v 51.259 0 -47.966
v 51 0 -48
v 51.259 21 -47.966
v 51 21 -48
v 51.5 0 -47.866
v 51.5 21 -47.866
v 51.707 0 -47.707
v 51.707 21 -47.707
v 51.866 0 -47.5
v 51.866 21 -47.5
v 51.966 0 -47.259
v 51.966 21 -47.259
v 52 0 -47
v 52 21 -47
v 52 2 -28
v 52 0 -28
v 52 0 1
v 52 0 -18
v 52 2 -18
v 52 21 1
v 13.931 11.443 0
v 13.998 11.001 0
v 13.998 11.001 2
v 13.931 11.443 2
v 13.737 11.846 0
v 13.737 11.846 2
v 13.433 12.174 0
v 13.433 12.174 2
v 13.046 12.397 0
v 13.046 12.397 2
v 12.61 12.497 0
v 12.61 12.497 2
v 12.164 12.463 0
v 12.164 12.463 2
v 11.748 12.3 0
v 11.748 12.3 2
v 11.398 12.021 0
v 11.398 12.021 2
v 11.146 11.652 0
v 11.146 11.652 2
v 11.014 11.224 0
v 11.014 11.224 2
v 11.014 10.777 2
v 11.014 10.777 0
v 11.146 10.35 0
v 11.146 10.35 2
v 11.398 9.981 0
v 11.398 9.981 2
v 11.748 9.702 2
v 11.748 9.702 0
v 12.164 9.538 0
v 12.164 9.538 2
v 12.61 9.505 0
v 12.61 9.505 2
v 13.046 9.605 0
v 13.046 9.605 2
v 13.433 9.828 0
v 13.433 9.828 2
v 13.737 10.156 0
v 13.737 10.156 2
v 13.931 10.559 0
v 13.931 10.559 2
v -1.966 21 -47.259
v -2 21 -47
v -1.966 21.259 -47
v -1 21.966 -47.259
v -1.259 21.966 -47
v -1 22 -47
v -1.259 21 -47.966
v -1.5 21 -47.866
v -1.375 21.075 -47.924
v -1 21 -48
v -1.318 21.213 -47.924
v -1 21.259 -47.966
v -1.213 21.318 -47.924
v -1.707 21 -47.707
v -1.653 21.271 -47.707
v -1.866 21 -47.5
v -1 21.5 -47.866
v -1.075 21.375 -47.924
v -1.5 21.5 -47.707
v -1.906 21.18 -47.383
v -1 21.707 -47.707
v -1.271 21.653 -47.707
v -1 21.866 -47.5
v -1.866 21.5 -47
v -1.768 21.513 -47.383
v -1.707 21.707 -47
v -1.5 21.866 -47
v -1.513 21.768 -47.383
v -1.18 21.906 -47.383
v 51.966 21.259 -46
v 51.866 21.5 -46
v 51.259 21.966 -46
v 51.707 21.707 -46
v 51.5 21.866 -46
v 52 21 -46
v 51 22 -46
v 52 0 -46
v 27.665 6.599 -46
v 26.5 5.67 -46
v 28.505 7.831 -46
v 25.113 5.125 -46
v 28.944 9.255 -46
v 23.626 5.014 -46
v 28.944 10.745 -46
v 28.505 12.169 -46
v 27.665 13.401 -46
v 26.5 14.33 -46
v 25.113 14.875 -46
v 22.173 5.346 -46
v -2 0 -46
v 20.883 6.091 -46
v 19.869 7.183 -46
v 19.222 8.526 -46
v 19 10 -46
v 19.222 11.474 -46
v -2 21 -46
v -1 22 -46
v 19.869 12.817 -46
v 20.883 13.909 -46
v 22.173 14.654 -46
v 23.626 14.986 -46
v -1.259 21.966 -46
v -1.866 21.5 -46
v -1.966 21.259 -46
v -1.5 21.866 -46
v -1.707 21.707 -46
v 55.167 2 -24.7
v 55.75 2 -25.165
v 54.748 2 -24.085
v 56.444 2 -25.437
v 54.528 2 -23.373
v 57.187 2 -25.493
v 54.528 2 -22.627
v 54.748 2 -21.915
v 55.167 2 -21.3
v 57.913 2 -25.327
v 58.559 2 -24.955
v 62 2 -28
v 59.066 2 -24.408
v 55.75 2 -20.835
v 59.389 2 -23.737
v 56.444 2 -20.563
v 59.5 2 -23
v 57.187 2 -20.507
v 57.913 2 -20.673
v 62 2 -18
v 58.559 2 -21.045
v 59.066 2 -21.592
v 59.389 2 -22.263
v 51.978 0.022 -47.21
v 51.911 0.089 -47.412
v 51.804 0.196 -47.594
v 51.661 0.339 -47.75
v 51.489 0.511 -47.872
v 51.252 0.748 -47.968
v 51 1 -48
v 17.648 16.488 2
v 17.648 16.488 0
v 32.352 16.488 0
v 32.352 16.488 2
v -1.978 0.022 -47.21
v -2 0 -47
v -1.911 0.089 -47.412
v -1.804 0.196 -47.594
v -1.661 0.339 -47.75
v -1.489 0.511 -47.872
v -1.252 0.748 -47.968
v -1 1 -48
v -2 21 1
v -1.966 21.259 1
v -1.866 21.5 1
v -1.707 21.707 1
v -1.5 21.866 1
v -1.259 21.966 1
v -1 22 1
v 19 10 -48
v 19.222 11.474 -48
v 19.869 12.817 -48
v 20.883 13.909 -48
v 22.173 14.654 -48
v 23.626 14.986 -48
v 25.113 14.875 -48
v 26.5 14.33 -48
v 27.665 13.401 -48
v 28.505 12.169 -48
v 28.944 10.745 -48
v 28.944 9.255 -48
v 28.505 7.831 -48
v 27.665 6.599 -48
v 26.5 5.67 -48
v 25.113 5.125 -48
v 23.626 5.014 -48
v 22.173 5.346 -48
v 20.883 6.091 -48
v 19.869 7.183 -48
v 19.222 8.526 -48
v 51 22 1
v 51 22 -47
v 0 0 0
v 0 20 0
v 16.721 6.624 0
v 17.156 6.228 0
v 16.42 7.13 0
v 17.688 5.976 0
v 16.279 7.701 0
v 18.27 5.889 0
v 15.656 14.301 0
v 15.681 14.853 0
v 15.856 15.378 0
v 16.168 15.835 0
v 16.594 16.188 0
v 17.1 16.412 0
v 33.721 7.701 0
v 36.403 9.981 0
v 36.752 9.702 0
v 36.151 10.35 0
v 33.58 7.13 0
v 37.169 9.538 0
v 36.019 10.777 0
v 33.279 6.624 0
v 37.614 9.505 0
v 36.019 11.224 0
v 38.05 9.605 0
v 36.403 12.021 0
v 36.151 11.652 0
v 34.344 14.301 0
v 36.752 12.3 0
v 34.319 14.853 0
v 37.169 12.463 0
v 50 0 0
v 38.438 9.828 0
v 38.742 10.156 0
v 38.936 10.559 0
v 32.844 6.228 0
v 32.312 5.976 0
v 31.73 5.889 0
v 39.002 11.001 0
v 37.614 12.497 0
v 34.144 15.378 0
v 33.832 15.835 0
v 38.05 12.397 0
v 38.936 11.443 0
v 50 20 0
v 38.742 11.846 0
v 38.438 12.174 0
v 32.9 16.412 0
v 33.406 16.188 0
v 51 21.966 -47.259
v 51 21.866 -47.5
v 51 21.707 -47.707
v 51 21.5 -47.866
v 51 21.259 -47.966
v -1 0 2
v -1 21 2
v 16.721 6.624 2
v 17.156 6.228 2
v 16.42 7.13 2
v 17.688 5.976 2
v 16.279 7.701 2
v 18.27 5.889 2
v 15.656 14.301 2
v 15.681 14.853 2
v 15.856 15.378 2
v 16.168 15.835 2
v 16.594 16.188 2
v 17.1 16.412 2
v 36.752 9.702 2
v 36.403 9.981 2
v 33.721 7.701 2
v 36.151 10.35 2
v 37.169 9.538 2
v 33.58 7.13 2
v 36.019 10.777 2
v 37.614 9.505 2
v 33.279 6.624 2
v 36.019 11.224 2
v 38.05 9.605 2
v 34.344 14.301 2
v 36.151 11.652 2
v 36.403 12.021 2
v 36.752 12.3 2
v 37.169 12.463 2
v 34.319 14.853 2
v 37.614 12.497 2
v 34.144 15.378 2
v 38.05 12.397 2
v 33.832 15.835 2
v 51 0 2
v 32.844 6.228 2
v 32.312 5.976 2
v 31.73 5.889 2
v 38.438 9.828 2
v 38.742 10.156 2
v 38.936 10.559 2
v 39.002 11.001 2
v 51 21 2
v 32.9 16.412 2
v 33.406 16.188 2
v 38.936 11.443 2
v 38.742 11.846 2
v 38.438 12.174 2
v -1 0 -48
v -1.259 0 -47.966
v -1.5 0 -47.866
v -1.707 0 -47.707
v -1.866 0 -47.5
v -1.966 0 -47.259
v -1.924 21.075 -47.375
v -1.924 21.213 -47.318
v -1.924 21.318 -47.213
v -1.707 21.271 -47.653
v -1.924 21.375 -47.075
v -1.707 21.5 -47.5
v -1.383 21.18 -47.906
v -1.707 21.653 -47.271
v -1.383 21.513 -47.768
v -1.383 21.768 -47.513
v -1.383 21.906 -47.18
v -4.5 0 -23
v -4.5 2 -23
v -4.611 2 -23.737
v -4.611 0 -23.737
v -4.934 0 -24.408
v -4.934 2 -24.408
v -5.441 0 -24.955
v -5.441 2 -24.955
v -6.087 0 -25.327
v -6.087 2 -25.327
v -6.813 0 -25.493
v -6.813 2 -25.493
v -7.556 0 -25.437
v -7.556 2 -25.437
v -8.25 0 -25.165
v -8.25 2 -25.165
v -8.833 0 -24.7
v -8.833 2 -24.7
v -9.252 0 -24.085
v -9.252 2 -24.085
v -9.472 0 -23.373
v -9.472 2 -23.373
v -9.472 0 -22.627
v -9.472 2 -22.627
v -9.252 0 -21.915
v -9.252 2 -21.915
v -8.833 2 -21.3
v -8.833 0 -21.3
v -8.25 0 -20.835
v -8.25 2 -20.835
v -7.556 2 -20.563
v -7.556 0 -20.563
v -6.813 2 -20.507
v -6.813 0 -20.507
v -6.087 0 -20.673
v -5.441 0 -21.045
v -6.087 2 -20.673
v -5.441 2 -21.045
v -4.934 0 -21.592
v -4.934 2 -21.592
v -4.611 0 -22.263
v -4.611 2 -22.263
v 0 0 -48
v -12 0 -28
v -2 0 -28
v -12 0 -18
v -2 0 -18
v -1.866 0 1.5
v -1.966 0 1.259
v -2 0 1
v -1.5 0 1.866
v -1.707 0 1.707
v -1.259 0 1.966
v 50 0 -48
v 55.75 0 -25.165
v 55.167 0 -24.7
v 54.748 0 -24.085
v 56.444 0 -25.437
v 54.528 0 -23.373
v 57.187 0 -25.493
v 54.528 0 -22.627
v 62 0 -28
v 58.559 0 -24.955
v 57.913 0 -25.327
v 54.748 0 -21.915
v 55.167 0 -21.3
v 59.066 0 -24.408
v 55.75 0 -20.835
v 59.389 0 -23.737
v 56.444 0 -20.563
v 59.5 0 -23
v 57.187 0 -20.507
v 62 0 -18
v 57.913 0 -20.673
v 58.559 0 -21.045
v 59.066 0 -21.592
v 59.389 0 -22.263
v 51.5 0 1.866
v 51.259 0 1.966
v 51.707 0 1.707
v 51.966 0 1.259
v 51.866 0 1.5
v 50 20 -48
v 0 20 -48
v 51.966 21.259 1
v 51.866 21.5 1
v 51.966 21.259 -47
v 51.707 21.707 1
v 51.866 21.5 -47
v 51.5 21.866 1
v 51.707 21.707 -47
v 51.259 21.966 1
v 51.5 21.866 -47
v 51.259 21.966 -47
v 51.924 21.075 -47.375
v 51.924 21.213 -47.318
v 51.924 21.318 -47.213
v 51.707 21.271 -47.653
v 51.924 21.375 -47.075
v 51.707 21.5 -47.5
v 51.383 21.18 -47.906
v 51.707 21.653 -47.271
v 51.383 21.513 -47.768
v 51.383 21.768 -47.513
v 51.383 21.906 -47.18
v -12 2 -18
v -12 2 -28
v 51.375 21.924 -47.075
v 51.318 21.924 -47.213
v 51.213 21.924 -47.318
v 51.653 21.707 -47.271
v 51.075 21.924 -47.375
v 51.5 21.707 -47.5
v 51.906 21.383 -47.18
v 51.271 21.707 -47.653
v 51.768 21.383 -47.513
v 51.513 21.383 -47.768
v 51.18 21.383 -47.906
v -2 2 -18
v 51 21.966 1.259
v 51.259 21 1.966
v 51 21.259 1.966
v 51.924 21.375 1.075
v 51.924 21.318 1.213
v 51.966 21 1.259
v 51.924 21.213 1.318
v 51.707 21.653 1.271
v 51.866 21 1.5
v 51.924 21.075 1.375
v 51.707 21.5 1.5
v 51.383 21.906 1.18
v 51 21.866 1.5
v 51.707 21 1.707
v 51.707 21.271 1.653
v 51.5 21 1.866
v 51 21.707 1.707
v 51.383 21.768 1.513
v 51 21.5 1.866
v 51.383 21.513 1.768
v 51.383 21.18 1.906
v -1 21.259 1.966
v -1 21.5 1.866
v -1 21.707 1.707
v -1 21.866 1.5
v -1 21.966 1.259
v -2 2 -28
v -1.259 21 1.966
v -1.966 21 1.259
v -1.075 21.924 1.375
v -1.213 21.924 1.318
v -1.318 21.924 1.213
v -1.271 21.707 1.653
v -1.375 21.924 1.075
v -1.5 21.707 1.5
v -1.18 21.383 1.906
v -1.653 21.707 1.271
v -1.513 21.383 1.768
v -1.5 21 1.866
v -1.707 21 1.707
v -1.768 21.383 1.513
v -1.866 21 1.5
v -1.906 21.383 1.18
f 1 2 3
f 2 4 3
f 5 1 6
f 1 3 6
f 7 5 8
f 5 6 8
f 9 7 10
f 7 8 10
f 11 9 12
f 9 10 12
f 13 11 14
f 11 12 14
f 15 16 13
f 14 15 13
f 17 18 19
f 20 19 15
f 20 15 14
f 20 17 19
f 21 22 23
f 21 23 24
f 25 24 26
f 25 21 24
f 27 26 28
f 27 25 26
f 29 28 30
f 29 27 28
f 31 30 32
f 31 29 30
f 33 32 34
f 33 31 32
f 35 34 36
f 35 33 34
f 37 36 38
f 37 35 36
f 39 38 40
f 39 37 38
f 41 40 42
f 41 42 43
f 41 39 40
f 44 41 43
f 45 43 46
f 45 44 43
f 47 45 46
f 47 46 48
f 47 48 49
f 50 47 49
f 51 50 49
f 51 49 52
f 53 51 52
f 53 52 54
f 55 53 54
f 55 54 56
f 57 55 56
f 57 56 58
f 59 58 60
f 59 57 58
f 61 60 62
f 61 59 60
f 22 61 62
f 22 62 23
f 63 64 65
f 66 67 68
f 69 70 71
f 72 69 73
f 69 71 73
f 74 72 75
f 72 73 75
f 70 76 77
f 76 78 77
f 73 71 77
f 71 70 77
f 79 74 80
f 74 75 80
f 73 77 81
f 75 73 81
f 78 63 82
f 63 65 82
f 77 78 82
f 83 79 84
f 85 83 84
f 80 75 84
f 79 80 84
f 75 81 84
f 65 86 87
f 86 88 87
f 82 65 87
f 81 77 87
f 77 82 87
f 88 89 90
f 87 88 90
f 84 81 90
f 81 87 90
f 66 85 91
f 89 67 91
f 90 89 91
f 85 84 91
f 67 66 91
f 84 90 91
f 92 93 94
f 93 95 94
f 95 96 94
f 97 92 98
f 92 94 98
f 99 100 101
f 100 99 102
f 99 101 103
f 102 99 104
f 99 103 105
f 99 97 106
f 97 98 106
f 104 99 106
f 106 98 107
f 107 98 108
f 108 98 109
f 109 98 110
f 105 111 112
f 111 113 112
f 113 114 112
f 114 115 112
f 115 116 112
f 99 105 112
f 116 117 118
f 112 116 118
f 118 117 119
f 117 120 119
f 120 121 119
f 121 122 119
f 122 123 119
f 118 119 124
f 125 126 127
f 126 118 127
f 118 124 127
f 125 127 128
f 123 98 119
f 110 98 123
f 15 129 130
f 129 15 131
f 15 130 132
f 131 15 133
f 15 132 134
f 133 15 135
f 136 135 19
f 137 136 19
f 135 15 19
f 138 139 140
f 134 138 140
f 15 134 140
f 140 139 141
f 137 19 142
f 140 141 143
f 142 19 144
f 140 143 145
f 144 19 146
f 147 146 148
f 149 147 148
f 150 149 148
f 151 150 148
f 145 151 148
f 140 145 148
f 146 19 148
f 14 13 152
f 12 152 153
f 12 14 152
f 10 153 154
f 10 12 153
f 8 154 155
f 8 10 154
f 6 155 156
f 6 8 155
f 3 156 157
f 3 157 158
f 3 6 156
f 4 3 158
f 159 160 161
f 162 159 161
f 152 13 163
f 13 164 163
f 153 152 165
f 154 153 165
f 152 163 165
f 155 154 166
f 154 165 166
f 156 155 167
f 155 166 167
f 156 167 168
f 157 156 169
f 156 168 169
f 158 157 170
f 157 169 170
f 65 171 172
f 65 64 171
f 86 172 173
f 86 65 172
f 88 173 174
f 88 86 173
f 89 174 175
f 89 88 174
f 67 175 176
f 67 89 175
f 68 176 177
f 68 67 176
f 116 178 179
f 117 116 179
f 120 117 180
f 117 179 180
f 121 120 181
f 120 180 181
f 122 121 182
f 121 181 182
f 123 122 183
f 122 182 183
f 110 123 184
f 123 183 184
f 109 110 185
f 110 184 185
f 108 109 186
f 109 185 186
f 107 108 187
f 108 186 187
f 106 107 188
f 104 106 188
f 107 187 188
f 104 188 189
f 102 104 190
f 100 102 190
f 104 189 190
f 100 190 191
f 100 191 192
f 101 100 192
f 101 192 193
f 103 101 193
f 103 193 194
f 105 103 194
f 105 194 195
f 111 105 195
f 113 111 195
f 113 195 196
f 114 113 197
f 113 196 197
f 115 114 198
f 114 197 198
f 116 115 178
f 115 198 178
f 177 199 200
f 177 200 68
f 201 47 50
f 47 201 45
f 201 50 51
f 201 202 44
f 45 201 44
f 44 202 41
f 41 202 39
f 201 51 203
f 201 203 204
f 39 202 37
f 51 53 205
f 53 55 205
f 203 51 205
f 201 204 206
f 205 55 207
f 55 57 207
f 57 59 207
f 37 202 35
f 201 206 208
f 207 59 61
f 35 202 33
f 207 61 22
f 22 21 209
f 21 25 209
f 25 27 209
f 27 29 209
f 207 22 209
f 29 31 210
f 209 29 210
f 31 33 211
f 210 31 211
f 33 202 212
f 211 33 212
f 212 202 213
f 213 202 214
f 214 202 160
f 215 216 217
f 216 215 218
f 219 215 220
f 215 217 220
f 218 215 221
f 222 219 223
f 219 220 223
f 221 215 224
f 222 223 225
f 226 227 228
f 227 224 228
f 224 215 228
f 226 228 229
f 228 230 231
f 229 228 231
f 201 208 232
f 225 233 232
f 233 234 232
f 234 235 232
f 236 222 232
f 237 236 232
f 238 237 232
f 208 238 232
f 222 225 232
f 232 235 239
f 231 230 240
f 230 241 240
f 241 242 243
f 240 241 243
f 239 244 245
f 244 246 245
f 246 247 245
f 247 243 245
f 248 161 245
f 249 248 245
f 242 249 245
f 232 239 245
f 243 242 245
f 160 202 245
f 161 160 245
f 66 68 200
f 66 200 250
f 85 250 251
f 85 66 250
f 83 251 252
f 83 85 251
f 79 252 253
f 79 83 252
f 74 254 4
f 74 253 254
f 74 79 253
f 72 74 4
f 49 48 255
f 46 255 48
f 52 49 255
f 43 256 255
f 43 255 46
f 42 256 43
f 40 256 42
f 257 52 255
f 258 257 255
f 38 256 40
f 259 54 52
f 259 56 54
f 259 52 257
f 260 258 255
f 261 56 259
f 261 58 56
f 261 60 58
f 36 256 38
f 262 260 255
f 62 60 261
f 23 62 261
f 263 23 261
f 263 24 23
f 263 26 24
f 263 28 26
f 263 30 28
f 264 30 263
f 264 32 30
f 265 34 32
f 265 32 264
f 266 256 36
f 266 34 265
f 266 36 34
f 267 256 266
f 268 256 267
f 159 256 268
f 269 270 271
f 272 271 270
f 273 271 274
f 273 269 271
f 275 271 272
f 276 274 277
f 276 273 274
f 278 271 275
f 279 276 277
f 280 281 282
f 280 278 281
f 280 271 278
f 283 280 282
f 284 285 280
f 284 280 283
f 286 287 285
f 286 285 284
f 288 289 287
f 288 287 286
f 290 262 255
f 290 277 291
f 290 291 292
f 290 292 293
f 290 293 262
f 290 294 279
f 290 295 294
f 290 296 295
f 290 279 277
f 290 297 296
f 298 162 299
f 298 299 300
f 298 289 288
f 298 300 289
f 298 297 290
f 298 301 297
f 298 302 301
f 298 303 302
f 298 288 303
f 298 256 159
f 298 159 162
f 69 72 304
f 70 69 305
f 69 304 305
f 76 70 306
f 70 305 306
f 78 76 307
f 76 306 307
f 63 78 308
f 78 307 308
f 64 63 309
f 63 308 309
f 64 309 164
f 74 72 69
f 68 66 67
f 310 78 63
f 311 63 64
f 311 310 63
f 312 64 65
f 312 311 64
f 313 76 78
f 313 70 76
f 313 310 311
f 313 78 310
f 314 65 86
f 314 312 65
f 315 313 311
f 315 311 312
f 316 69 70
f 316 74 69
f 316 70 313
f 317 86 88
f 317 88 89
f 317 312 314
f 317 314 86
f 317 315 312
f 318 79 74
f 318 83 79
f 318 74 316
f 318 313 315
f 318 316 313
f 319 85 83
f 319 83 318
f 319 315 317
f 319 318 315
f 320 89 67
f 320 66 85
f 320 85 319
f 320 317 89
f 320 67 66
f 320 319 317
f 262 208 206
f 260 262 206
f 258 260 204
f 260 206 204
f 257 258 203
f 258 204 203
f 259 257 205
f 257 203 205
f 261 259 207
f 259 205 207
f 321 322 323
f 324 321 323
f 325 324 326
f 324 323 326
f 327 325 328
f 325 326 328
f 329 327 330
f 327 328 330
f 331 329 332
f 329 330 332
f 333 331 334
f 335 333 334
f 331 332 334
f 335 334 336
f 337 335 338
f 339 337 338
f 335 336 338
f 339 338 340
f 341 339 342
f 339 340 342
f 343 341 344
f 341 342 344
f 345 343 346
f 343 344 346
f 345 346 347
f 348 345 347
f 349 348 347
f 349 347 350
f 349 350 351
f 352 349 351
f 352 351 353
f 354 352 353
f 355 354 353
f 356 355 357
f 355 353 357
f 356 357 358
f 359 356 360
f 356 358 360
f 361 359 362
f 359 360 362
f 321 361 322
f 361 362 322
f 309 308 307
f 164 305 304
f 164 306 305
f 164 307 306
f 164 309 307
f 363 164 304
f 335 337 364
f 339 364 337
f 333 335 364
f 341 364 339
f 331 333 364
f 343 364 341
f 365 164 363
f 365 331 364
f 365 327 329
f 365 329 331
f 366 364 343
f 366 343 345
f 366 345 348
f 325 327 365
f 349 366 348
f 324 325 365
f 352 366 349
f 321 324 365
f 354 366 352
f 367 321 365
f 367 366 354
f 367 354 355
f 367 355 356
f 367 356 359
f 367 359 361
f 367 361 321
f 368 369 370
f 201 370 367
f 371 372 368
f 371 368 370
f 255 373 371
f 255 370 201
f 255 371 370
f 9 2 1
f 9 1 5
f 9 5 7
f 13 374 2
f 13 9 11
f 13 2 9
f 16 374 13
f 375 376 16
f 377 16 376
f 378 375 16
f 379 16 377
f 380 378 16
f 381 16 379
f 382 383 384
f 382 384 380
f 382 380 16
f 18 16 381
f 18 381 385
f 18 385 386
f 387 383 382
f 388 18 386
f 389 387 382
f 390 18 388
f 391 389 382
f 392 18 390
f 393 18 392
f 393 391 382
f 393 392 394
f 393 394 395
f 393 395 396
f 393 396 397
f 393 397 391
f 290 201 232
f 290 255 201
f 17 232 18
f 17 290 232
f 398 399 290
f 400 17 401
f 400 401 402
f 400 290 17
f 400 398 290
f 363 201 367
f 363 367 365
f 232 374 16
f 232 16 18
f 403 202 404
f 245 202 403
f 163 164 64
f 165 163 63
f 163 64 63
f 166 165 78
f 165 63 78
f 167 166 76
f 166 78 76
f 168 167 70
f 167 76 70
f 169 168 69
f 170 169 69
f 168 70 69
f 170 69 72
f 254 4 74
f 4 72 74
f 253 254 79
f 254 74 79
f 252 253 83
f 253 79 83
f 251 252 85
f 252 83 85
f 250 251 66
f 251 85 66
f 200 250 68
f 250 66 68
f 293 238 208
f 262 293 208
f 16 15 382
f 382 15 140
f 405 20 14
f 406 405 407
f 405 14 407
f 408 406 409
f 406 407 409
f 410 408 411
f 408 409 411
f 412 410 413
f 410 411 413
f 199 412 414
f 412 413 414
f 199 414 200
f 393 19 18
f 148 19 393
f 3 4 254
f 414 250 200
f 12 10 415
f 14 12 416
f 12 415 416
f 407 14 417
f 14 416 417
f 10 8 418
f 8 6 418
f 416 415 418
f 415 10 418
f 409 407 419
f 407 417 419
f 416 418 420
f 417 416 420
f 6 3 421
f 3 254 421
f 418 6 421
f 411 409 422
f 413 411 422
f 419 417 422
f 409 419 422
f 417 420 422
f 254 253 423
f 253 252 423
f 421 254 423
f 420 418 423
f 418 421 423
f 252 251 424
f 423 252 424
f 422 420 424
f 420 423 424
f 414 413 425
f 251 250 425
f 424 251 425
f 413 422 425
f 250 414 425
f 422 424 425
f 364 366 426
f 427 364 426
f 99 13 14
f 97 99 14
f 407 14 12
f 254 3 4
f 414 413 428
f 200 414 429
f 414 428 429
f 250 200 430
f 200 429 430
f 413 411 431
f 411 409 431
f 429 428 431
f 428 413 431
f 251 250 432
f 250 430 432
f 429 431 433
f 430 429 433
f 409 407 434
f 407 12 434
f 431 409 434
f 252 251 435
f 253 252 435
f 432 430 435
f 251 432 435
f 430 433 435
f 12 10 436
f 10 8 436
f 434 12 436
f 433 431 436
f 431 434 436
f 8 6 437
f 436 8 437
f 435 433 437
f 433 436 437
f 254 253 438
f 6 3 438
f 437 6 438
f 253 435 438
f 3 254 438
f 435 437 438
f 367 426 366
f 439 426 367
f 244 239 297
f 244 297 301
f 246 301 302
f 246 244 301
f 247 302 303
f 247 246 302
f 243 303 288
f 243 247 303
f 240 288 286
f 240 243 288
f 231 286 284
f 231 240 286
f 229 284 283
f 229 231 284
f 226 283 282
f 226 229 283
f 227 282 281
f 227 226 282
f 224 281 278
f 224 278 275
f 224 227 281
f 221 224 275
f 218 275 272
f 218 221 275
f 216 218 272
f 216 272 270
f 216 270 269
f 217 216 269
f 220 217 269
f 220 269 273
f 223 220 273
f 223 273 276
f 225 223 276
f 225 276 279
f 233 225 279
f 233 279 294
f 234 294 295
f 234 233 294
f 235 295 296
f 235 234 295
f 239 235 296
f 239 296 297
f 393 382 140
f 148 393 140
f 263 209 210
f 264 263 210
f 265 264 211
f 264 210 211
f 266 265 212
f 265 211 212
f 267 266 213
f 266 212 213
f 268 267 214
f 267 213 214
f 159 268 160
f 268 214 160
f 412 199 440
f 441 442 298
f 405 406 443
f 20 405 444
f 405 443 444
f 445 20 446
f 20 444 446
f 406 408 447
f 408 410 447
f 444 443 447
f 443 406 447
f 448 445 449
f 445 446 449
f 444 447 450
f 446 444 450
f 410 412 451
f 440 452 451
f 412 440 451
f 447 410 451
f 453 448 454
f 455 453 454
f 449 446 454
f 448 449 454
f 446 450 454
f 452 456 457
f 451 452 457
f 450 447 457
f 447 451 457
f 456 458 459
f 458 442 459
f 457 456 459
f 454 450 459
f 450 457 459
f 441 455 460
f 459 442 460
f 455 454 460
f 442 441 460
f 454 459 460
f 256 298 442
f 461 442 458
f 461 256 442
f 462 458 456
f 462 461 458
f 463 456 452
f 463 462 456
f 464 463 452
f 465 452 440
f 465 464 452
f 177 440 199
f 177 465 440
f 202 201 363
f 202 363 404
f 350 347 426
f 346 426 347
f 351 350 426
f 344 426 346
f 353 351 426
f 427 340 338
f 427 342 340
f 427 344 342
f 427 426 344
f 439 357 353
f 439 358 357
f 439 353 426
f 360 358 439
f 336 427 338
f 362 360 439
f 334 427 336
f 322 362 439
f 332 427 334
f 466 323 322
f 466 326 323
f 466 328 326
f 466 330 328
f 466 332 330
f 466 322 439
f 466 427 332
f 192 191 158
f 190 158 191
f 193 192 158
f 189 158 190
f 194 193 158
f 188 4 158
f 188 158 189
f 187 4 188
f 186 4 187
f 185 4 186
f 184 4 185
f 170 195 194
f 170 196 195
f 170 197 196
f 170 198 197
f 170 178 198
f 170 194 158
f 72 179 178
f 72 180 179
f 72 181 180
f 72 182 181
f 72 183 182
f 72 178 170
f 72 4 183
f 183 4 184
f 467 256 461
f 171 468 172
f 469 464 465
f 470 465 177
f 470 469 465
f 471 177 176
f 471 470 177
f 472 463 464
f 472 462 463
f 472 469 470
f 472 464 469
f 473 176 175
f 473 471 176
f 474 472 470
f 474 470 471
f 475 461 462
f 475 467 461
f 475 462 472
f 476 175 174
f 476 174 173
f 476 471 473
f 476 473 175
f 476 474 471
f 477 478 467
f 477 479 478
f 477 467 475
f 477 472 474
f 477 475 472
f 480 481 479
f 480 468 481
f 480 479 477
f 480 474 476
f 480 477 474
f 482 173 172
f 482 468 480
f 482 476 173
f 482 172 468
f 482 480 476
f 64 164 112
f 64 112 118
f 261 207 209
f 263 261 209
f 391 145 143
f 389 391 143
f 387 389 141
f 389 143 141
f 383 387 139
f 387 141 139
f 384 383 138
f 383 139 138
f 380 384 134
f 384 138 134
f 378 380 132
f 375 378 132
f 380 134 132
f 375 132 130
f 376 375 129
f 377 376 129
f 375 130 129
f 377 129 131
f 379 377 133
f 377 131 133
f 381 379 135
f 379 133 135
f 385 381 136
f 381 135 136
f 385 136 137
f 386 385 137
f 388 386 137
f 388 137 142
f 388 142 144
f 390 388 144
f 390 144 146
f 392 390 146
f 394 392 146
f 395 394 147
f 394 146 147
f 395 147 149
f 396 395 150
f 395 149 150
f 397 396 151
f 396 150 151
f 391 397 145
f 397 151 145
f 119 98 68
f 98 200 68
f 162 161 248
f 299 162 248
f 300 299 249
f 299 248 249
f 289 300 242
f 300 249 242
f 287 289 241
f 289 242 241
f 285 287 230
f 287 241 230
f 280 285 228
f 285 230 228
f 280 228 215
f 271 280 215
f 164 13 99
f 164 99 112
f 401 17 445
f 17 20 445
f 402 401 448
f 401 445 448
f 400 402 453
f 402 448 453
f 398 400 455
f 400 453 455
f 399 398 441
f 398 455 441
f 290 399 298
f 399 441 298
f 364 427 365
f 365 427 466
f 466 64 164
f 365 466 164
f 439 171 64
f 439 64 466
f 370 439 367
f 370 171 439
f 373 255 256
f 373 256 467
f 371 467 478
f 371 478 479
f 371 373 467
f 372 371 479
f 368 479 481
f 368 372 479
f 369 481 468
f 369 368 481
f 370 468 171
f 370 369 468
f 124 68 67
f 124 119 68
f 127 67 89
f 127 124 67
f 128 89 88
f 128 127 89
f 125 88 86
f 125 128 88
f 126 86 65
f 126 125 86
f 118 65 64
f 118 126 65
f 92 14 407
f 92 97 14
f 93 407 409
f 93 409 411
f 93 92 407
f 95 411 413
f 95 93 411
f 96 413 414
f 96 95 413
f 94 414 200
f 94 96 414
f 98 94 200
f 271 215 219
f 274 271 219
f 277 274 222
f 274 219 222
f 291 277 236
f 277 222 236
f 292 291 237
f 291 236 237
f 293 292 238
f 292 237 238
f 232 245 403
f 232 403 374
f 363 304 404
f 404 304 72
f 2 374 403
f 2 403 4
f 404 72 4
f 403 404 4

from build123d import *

# Parameters (mm, degrees)
SKETCH1_W           = 50
SKETCH1_H           = 20
SKETCH1_R           = 1.5
BOSS_EXTRUDE1_DEPTH = 2
BOSS_EXTRUDE3_DEPTH = 50
SKETCH4_W           = 54
SKETCH4_H           = 22
SKETCH4_R           = 5
BOSS_EXTRUDE4_DEPTH = 2
SKETCH5_W           = 10
SKETCH5_H           = 2
BOSS_EXTRUDE5_DEPTH = 5
FILLET1_R           = 1
FILLET2_R           = 1
SKETCH6_R           = 2.5
CUT_EXTRUDE1_DEPTH  = 2


with BuildPart() as part:
    # Sketch1 → Boss-Extrude1 (new body)
    with BuildSketch(Plane.XY):
        with Locations((25, 10)):
            Rectangle(SKETCH1_W, SKETCH1_H)
        with Locations((12.497693795, 11.000889914)):
            Circle(SKETCH1_R, mode=Mode.SUBTRACT)
        with Locations((37.502306205, 11.000889914)):
            Circle(SKETCH1_R, mode=Mode.SUBTRACT)
        with BuildLine():
            Line((17.647559495, 16.488444137), (32.352440505, 16.488444137))
            ThreePointArc((32.352440505, 16.488444137), (33.831577141, 15.834607133), (34.34359951, 14.300598948))
            Line((34.34359951, 14.300598948), (33.7210129, 7.701180879))
            ThreePointArc((33.7210129, 7.701180879), (33.07601689, 6.409889432), (31.729853895, 5.889026069))
            Line((31.729853895, 5.889026069), (18.270146105, 5.889026069))
            ThreePointArc((18.270146105, 5.889026069), (16.92398311, 6.409889432), (16.2789871, 7.701180879))
            Line((16.2789871, 7.701180879), (15.65640049, 14.300598948))
            ThreePointArc((15.65640049, 14.300598948), (16.168422859, 15.834607133), (17.647559495, 16.488444137))
        make_face(mode=Mode.SUBTRACT)
    extrude(amount=BOSS_EXTRUDE1_DEPTH)

    # Sketch2 → Boss-Extrude3 (add)
    with BuildSketch(Plane.XY.offset(2)):
        Polygon((50, 0), (52, 0), (52, 22), (-2, 22), (-2, 0), (0, 0), (0, 20), (50, 20), align=None)
    extrude(amount=-BOSS_EXTRUDE3_DEPTH)

    # Sketch5 → Boss-Extrude5 (add, symmetric)
    with BuildSketch(Plane.XY.offset(-23)):
        with Locations((-7, 1)):
            Rectangle(SKETCH5_W, SKETCH5_H)
        with Locations((57, 1)):
            Rectangle(SKETCH5_W, SKETCH5_H)
    extrude(amount=BOSS_EXTRUDE5_DEPTH, both=True)

    # Fillet1
    fillet1_edges = [part.edges().sort_by_distance(p)[0] for p in [
        (-2, 11, 2),
        (25, 22, 2),
        (-2, 22, -23),
        (52, 11, -48),
        (52, 22, -23),
        (-2, 11, -48),
        (25, 22, -48),
        (52, 11, 2),
    ]]
    fillet(fillet1_edges, radius=FILLET1_R)

    # Sketch6 → Cut-Extrude1 (cut)
    with BuildSketch(Plane(origin=(0, 2, 0), x_dir=(1, 0, 0), z_dir=(0, 1, 0))):
        with Locations((-7, 23)):
            Circle(SKETCH6_R)
        with Locations((57, 23)):
            Circle(SKETCH6_R)
    extrude(amount=-CUT_EXTRUDE1_DEPTH, mode=Mode.SUBTRACT)


with BuildPart() as body_2:
    # Sketch4 → Boss-Extrude4 (new body)
    with BuildSketch(Plane(origin=(0, 0, -48), x_dir=(-1, 0, 0), z_dir=(0, 0, -1))):
        with Locations((-25, 11)):
            Rectangle(SKETCH4_W, SKETCH4_H)
        with Locations((-24, 10)):
            Circle(SKETCH4_R, mode=Mode.SUBTRACT)
    extrude(amount=-BOSS_EXTRUDE4_DEPTH)

    # Fillet2
    fillet2_edges = [body_2.edges().sort_by_distance(p)[0] for p in [
        (25, 22, -48),
        (-2, 11, -48),
        (25, 0, -48),
        (52, 11, -48),
        (52, 22, -47),
        (-2, 22, -47),
    ]]
    fillet(fillet2_edges, radius=FILLET2_R)


solid = Compound([part.part, body_2.part])
